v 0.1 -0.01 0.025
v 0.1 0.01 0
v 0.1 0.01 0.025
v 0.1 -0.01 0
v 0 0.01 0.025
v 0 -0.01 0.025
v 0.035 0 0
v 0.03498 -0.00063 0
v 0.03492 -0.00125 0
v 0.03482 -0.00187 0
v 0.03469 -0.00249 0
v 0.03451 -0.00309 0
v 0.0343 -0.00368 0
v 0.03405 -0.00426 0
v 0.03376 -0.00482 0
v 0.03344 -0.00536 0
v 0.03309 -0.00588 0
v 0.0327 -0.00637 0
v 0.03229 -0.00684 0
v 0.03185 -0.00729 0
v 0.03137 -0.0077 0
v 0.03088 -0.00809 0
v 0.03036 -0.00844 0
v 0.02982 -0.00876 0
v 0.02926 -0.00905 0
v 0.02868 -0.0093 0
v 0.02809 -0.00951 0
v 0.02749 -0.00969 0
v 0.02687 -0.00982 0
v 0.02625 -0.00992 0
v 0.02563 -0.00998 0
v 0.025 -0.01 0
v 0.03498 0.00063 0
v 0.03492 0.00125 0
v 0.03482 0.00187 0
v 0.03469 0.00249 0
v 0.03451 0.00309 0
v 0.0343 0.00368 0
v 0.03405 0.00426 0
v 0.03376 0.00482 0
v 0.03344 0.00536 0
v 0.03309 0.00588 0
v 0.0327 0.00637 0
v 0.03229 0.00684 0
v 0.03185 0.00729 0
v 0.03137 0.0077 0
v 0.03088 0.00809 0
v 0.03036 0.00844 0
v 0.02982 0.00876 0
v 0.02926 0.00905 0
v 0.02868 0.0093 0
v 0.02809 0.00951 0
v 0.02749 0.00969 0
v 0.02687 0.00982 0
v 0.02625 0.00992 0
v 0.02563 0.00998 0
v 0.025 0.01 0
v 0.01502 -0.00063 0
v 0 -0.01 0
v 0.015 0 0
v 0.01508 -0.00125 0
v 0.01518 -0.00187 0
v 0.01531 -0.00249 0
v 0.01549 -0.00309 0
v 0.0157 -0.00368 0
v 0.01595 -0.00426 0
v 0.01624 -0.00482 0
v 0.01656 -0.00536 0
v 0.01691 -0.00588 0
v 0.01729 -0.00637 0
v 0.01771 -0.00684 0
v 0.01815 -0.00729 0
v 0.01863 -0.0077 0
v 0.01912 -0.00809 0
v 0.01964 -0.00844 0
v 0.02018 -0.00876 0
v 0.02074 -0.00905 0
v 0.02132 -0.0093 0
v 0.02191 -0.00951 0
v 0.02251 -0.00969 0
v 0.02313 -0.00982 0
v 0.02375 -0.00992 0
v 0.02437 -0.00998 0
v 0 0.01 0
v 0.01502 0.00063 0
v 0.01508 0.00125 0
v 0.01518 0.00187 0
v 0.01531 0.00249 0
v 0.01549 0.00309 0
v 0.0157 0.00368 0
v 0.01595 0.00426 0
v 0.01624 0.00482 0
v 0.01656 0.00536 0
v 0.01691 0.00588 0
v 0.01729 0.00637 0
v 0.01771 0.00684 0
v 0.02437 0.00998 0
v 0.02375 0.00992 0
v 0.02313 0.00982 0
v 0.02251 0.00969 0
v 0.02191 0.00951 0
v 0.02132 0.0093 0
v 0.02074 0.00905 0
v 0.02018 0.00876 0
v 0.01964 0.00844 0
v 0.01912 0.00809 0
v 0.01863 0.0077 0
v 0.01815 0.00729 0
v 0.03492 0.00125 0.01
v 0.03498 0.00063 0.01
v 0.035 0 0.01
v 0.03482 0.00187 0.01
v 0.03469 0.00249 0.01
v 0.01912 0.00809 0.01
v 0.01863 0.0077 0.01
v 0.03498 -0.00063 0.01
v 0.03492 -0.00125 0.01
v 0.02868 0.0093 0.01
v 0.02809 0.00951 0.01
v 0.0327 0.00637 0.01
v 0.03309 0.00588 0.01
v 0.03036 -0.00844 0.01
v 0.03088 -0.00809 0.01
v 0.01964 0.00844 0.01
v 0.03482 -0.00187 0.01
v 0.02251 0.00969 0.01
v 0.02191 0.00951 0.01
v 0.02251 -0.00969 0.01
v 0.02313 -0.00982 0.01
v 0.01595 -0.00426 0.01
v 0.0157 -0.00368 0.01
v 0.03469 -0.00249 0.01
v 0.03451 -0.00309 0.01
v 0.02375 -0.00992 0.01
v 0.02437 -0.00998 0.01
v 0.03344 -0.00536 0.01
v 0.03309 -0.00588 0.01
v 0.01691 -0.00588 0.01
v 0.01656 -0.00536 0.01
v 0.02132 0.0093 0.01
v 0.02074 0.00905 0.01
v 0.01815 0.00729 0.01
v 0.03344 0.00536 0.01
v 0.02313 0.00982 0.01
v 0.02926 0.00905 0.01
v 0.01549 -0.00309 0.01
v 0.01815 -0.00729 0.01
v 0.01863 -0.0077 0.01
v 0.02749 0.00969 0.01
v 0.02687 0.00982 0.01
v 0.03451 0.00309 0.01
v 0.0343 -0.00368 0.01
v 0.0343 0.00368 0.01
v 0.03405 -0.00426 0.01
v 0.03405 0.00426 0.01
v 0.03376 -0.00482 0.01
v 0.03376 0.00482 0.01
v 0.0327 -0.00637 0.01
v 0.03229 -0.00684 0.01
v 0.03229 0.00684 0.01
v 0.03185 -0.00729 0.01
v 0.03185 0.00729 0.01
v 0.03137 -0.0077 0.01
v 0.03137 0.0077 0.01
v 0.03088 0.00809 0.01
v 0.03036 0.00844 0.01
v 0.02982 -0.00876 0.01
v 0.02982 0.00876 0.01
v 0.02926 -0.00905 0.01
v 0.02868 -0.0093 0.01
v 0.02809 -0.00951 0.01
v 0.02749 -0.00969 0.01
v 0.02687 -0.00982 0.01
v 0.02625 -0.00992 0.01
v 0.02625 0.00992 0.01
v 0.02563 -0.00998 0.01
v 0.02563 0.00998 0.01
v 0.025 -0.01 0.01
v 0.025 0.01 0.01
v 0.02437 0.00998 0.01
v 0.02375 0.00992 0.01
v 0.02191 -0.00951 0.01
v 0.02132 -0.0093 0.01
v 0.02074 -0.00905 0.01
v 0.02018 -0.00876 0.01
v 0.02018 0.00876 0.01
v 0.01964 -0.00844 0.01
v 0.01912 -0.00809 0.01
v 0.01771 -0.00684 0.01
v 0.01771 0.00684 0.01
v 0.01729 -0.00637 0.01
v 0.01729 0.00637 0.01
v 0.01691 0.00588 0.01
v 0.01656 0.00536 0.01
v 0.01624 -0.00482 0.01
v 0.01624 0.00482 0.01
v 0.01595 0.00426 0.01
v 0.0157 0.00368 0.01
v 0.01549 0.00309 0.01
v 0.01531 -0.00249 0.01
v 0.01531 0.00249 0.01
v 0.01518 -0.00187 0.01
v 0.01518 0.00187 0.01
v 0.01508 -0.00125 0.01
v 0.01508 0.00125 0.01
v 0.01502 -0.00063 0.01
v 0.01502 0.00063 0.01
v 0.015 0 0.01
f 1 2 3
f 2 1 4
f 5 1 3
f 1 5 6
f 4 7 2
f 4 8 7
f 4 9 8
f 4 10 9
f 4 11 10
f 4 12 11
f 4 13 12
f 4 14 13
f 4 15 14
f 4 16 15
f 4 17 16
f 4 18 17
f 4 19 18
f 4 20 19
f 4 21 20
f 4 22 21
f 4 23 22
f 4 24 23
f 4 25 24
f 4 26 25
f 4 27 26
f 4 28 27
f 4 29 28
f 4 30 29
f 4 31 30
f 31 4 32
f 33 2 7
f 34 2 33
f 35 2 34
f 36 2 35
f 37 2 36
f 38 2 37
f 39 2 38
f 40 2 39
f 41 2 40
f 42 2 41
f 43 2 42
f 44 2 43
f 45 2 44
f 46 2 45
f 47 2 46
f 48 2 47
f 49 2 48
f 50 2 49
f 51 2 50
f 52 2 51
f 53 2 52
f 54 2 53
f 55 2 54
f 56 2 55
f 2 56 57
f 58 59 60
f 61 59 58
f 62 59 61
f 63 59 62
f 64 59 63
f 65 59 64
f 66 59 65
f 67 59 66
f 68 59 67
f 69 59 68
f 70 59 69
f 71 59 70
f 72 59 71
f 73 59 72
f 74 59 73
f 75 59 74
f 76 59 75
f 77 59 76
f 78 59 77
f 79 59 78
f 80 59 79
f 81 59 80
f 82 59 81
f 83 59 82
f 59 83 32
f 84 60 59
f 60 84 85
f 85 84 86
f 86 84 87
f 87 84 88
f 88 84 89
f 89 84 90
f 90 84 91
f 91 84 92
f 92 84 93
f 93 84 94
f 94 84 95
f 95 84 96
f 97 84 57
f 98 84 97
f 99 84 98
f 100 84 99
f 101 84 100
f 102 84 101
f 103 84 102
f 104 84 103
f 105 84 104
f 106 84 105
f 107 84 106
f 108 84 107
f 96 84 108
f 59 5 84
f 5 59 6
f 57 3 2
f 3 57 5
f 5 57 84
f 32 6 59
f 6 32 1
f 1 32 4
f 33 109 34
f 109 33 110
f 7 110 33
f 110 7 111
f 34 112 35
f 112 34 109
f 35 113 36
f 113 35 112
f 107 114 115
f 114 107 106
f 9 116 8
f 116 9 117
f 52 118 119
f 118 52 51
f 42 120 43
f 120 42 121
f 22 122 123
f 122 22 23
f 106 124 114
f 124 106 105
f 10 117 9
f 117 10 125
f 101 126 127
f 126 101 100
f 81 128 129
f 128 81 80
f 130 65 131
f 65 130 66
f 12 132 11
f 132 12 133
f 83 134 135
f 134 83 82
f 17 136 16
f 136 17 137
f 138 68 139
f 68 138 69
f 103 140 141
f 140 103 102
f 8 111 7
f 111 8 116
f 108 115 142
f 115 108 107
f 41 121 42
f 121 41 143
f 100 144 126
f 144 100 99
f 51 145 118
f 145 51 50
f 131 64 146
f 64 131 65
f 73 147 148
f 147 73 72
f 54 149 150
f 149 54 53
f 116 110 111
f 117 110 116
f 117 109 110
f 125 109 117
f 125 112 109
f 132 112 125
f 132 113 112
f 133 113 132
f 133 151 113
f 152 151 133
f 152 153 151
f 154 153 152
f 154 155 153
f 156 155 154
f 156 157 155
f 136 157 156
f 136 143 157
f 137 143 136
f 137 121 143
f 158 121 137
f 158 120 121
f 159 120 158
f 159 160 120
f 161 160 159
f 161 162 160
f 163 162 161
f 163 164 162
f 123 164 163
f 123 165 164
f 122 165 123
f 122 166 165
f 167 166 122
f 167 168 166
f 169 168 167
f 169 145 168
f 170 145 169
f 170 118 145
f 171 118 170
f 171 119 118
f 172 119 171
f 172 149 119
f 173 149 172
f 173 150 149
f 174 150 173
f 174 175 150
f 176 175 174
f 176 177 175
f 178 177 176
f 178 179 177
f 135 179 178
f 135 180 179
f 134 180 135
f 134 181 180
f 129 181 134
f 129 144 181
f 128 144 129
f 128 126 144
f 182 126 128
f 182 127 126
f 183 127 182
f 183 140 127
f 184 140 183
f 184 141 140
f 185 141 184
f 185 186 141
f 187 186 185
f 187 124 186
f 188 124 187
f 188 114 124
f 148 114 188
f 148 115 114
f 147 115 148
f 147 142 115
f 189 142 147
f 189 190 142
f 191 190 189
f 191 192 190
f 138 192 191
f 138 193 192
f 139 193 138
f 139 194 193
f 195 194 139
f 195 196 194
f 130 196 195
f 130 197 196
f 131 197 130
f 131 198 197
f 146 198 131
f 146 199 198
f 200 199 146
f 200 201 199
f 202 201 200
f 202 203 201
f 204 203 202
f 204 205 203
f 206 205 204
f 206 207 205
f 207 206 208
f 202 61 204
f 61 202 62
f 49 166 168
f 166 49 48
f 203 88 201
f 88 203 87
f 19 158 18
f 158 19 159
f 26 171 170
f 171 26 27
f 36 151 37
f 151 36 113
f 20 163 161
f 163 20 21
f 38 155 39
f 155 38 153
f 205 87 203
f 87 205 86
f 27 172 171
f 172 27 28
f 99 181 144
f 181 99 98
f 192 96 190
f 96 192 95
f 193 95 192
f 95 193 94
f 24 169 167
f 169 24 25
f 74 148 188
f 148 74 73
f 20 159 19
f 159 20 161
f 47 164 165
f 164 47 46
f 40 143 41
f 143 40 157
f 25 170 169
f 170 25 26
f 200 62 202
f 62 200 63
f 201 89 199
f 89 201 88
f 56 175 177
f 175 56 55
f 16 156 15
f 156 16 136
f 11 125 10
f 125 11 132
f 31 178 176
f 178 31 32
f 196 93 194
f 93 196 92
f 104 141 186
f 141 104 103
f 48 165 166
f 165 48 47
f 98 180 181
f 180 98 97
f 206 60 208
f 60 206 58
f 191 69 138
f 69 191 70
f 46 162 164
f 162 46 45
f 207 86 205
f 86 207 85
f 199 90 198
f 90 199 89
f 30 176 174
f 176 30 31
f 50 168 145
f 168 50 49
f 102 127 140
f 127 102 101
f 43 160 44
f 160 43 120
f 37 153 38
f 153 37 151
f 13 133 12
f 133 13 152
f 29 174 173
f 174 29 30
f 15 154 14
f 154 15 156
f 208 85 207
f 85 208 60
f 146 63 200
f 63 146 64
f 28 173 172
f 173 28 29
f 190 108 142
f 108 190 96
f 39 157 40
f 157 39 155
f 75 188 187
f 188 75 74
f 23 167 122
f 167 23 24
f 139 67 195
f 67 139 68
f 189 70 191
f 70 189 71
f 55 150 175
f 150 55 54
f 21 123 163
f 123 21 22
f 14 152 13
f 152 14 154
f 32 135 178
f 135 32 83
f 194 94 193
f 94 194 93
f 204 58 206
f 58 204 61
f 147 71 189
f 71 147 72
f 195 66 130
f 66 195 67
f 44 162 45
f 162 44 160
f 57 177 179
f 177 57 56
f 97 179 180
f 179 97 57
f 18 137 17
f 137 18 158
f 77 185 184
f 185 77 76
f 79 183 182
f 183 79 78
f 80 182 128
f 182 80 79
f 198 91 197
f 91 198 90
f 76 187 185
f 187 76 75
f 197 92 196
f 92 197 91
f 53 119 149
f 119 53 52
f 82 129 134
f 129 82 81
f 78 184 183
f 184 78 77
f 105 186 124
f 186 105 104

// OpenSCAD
s = 1;

length = 0.1;
width = 0.025;
depth = 0.020;
chfdepth = 0;
chfangle = 45;
tcpoffset = 0.075;
cutpos = 0.0;
cutoffset = 0.0;
cutdepth = 0.01;
cutwidth = 0.02;
cutangle = 0;

/* Produces basic box finger */
module basicShape(length, width, depth)
{
	translate([0, -depth/2, 0]) cube([length, depth, width]);
}

/* Produces the chamfering geometry.
 * length -- length of the finger
 * start_depth -- distance from the finger plane at which the chamfer starts
 * angle --- chamfering angle
 */
module chamfering(length, start_depth, angle) {
	size = 1000;

	translate([length, 0, start_depth])
		rotate([0, 90-angle, 0])
			translate([0, 0, size/2])
				cube(size, center = true);
}

/* Produces the geometry for the cutout.
 * cutpos -- the position of the cutout
 * cutoffset -- the offset along the y axis
 * cutdepth -- the depth of the cutout
 * cutdiameter -- the diameter of the cutout
 */
module cutout(cutpos, cutoffset, cutdepth, cutdiameter, cutangle) {
	size = 1000;

	r = cutdiameter/2;
	dr = 2 * cutdepth * tan(cutangle/2);

	translate([cutpos, cutoffset, 0])
		cylinder(h = 2*cutdepth, r1 = r+dr, r2 = r, $fn = 100, center = true);
}

/* Produces the finger geometry.
 * Parameters...
 */
module finger(length, width, depth, chfdepth, chfangle, cutpos, cutoffset, cutdepth, cutdiameter, cutangle) {
	difference() {
		difference() {
			basicShape(length, width, depth);
			chamfering(length, width - width * chfdepth, chfangle);

echo(depth - chfdepth);
		}
		cutout(cutpos, cutoffset, cutdepth, cutdiameter, cutangle);
	}
}

scale(s)
	finger(length, width, depth, chfdepth, chfangle, length-tcpoffset+cutpos, cutoffset, cutdepth, cutwidth, cutangle);
